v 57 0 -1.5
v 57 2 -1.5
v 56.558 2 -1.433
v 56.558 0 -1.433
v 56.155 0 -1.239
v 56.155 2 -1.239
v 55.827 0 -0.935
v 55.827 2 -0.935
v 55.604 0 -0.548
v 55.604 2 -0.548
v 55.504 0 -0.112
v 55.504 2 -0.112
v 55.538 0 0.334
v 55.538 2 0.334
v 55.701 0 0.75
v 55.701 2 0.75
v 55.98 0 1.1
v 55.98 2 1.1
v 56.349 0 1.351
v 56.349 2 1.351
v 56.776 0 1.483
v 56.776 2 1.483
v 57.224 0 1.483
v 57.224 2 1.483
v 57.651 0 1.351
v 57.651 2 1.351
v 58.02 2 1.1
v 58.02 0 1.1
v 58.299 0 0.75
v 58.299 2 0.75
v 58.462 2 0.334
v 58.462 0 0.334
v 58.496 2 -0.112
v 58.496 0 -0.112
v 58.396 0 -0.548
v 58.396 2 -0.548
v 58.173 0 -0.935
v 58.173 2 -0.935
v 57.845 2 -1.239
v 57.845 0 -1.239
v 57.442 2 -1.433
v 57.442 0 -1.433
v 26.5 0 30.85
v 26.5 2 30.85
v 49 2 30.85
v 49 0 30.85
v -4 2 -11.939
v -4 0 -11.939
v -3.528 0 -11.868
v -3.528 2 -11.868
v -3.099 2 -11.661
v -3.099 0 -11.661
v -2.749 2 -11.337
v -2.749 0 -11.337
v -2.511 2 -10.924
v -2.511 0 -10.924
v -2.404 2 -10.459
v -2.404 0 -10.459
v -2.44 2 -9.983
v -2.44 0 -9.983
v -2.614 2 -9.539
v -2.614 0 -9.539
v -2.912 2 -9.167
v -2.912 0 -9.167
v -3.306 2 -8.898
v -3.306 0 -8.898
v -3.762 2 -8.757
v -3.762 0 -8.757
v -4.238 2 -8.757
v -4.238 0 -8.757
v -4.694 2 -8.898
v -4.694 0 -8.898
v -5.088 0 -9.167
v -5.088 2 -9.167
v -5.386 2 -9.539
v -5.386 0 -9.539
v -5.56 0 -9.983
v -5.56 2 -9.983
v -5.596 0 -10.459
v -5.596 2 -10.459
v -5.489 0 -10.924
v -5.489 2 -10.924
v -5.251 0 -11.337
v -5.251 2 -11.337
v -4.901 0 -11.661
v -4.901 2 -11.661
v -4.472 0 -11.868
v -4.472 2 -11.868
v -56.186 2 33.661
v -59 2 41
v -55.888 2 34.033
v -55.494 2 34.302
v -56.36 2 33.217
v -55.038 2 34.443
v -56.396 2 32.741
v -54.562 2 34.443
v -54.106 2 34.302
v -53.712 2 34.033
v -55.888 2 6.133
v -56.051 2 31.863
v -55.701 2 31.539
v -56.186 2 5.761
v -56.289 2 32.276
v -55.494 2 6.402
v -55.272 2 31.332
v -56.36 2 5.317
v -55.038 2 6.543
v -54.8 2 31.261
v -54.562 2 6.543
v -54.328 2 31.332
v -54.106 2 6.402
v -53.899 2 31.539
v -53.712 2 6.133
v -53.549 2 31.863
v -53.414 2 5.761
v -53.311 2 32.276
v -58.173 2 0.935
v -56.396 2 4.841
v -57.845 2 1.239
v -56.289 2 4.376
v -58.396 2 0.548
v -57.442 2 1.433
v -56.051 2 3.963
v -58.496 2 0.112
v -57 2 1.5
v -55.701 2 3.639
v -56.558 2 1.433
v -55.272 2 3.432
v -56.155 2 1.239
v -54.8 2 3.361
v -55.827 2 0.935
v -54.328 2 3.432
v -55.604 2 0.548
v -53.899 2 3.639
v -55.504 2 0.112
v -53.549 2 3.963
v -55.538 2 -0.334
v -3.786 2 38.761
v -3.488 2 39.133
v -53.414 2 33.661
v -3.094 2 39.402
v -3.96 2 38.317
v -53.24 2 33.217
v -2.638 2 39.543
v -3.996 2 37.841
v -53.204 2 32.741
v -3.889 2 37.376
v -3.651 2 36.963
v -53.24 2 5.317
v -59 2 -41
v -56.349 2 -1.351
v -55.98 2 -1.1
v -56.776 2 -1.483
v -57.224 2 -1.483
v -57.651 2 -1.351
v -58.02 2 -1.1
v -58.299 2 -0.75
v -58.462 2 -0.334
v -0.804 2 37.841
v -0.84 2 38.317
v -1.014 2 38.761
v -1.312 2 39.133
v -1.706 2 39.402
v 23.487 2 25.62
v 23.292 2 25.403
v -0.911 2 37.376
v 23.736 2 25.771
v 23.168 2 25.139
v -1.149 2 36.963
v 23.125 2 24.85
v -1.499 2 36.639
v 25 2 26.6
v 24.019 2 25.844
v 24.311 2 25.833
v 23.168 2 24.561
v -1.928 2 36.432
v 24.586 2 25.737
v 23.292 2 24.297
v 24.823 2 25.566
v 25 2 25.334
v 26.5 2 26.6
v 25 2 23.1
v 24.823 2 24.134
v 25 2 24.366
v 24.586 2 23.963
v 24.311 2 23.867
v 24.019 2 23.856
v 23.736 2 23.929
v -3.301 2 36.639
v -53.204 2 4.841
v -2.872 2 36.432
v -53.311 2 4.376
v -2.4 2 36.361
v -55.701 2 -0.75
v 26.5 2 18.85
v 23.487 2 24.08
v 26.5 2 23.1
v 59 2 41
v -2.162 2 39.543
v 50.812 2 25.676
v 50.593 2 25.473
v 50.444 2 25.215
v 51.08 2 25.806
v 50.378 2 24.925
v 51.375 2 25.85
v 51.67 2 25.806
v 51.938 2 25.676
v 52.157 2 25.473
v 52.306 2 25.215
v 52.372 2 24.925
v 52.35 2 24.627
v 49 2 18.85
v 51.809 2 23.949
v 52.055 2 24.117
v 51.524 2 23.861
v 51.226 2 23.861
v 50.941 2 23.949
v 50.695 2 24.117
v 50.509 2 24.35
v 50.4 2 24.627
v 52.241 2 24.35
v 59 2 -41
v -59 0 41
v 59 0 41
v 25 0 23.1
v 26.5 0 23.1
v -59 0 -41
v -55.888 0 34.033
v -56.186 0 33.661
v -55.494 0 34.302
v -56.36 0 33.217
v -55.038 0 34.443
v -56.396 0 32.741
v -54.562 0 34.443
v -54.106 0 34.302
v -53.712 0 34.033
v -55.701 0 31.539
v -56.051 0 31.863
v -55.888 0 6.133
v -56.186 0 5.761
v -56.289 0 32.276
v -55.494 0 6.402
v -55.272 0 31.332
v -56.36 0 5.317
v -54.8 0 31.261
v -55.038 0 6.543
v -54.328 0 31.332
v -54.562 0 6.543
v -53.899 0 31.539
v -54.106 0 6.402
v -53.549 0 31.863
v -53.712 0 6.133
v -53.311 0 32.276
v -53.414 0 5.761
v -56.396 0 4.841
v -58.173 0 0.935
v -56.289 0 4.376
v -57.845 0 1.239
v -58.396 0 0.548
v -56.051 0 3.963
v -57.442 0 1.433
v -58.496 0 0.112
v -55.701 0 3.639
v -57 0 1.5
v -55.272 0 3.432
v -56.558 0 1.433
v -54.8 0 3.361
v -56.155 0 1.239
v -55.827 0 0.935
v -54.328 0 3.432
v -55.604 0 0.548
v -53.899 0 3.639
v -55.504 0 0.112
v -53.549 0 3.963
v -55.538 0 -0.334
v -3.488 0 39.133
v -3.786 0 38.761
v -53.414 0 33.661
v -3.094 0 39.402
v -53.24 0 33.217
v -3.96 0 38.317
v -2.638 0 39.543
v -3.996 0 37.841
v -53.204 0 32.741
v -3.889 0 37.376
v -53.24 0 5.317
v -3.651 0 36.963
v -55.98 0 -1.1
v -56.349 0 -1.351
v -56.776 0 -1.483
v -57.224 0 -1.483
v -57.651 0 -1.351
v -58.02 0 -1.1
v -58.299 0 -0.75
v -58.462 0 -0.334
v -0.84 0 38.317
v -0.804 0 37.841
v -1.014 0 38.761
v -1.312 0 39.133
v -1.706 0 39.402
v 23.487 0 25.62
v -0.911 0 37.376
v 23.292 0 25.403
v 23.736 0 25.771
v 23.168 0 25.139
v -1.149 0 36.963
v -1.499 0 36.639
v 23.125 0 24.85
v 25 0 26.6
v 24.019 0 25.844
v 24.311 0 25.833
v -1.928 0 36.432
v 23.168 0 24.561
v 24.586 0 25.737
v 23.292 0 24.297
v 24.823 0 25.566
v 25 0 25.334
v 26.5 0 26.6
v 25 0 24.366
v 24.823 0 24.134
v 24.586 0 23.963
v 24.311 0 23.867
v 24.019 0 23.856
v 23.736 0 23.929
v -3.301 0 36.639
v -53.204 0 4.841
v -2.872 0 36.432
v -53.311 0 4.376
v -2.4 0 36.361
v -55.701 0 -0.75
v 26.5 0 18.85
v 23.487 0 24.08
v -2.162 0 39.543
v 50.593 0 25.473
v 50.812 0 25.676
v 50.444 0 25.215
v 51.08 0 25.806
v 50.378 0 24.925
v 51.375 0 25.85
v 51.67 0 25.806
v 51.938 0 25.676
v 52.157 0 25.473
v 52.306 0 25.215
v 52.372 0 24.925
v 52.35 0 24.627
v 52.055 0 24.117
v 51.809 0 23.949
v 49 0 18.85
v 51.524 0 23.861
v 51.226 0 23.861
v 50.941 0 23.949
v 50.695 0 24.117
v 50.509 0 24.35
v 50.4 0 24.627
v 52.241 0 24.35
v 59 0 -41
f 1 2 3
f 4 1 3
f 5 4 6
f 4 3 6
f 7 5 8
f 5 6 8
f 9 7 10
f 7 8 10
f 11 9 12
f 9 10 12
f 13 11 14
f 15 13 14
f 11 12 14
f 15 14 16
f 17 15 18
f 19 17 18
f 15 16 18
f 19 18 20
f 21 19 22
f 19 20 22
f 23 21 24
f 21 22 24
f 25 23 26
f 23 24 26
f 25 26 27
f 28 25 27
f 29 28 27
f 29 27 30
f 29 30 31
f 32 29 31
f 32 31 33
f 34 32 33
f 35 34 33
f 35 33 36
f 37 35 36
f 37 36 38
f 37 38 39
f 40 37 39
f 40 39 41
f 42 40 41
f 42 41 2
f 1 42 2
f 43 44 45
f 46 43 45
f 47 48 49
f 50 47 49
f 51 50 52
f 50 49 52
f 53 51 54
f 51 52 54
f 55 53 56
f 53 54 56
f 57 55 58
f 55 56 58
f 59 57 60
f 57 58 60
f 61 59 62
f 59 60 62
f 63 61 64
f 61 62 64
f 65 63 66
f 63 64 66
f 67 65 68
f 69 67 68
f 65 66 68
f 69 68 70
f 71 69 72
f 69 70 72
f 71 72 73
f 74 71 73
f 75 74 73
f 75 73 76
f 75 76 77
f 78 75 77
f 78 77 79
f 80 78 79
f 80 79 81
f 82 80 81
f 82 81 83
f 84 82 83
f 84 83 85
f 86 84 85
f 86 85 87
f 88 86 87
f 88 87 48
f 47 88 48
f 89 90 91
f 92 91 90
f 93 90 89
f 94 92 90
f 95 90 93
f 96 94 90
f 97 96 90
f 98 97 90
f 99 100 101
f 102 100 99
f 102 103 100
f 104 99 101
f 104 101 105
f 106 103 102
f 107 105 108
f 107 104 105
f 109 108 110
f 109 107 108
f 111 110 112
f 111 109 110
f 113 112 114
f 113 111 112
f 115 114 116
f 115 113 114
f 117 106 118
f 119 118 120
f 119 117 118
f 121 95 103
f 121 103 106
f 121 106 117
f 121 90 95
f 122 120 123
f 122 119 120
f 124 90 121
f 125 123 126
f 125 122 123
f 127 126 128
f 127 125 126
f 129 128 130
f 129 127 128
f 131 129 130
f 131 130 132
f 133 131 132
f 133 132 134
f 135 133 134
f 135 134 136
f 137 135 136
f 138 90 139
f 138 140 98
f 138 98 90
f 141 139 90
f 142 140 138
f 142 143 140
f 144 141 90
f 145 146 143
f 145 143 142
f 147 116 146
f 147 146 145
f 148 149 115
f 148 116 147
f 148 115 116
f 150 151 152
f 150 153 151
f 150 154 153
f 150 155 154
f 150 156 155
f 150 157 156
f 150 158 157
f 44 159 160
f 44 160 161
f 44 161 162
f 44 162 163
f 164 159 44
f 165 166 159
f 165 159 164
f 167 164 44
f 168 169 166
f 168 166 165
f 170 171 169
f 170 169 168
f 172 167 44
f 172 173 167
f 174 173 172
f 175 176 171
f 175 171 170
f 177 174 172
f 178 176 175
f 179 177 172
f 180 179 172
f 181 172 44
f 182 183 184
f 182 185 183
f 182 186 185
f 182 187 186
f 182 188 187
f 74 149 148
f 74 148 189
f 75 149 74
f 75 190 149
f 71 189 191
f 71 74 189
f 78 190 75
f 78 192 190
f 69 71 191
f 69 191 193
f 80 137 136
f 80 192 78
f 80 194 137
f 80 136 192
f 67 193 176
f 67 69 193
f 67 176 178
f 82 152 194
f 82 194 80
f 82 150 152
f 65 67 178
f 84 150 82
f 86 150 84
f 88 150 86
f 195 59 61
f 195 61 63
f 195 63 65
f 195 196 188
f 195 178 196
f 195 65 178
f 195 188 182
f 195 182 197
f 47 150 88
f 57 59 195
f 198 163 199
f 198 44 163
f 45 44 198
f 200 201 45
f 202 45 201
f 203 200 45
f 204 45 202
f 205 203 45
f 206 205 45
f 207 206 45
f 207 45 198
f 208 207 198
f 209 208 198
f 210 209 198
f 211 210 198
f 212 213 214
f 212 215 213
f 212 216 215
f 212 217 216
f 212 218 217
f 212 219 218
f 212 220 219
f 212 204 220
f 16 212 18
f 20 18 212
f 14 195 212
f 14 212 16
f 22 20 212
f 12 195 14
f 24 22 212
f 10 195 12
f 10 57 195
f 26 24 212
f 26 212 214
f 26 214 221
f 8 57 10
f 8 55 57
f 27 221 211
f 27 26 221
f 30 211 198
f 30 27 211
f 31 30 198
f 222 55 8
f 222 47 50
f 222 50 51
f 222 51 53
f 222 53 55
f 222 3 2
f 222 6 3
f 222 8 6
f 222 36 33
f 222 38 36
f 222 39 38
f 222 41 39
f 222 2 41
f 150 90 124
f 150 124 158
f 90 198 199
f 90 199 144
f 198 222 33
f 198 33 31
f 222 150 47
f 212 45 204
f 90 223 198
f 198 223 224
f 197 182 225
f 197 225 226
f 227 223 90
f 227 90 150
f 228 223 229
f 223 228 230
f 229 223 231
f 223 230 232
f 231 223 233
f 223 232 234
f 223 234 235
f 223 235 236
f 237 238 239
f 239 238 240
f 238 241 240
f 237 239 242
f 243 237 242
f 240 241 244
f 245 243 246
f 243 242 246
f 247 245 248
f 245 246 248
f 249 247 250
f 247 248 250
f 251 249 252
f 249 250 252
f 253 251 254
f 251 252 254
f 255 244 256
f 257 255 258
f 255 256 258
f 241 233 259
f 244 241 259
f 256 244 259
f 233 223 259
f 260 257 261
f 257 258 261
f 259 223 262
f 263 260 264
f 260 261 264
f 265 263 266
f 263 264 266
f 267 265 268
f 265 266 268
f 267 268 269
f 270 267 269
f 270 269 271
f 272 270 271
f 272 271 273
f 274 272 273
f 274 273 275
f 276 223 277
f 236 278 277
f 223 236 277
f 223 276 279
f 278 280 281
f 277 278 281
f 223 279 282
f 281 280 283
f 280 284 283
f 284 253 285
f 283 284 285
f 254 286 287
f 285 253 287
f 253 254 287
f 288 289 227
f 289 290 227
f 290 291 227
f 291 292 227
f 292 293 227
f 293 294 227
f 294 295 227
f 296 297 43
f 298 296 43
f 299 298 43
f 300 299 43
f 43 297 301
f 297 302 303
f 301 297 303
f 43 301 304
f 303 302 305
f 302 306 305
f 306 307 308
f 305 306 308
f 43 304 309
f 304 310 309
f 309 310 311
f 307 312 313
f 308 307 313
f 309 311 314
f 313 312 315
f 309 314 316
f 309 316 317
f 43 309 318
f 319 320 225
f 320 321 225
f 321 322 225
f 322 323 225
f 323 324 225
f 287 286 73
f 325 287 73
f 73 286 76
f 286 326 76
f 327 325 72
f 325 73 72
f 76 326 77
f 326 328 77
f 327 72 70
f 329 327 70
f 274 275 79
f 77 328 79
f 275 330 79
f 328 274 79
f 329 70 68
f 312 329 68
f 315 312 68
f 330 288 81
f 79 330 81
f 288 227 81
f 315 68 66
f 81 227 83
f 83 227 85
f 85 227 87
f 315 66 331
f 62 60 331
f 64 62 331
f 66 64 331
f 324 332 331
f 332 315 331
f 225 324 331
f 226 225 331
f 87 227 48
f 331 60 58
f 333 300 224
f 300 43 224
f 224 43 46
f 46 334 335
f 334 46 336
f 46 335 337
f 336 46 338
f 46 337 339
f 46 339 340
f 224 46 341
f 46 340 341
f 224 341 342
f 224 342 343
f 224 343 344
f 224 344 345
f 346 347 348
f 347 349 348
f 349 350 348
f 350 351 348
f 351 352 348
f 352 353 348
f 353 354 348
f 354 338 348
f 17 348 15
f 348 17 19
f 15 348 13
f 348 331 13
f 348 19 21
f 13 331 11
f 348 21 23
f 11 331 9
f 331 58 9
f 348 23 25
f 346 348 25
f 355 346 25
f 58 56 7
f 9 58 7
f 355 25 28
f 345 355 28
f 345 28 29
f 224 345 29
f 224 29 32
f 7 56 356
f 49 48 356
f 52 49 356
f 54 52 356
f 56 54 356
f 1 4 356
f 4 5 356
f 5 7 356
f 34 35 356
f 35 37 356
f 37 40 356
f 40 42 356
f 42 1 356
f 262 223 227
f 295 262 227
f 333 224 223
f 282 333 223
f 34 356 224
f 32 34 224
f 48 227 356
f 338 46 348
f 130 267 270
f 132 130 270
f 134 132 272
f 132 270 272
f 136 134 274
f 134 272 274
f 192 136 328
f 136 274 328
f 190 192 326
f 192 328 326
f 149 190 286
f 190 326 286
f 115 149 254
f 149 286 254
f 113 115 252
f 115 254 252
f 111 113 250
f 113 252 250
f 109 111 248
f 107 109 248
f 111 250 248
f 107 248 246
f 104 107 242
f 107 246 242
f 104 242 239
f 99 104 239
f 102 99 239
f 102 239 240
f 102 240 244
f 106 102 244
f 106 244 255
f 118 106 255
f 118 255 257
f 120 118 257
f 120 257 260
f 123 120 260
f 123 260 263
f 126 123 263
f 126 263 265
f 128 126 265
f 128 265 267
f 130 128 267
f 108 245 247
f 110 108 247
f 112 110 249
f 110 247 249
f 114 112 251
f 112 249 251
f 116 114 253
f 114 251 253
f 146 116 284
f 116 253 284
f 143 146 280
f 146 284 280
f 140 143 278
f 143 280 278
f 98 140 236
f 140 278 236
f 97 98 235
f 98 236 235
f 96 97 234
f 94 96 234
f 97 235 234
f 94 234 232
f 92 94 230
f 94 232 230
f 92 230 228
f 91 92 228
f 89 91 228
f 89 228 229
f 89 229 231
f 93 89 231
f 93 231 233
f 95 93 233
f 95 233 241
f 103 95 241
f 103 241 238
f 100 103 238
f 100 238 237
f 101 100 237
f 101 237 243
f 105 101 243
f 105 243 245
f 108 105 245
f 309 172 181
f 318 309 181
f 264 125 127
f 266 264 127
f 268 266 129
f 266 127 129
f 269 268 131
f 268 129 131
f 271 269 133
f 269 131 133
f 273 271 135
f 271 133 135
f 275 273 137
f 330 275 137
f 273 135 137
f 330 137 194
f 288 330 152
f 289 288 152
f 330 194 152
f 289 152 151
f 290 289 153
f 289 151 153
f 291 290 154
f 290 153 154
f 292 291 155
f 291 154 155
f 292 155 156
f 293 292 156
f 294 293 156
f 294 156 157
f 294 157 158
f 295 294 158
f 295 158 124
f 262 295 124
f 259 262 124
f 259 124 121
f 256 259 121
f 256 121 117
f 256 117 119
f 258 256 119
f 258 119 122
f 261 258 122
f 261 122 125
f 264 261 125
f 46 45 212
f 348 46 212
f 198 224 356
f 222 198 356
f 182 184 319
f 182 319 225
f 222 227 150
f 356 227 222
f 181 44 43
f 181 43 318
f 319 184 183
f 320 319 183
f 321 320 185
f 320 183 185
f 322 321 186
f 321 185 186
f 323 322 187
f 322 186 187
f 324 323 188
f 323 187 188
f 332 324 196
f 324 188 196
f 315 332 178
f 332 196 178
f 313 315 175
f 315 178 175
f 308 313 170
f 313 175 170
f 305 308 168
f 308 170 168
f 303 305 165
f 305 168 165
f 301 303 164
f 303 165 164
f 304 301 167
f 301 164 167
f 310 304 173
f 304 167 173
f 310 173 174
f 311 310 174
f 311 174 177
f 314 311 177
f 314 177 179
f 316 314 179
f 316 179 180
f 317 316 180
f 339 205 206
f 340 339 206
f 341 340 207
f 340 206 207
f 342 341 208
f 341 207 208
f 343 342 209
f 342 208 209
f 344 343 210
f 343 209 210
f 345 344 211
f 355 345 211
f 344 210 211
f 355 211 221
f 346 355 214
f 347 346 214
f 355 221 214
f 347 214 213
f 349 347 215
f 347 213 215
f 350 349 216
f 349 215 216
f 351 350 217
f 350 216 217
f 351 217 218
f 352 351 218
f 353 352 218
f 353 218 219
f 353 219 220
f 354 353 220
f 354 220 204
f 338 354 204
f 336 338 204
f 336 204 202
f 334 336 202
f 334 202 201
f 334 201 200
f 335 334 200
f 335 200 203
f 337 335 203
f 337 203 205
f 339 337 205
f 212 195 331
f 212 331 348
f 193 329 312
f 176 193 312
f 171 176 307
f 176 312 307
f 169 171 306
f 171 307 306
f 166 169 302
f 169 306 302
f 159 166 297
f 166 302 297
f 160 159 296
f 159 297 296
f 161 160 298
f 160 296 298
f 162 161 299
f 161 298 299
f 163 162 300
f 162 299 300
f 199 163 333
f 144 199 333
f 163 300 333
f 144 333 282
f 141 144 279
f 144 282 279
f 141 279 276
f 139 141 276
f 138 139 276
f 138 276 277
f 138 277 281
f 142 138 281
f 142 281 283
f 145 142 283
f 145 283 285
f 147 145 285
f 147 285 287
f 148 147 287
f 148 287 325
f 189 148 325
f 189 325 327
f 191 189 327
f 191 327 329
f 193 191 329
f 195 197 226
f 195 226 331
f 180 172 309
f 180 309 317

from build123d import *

# Parameters (mm, degrees)
SKETCH1_W           = 118
SKETCH1_H           = 82
BOSS_EXTRUDE1_DEPTH = 2
SKETCH3_R           = 1.5
CUT_EXTRUDE5_DEPTH  = 10
SKETCH4_R           = 1.6
CUT_EXTRUDE6_DEPTH  = 10
SKETCH7_R           = 1
SKETCH7_W           = 1.5
SKETCH7_H           = 3.5
CUT_EXTRUDE7_DEPTH  = 10
SKETCH5_W           = 22.5
SKETCH5_H           = 12
CUT_EXTRUDE8_DEPTH  = 10


with BuildPart() as part:
    # Sketch1 → Boss-Extrude1 (new body)
    with BuildSketch(Plane(origin=(0, 0, 0), x_dir=(1, 0, 0), z_dir=(0, 1, 0))):
        Rectangle(SKETCH1_W, SKETCH1_H)
    extrude(amount=BOSS_EXTRUDE1_DEPTH)

    # Sketch3 → Cut-Extrude5 (cut)
    with BuildSketch(Plane(origin=(0, 2, 0), x_dir=(1, 0, 0), z_dir=(0, 1, 0))):
        with Locations(Location((-57, 0, 0), (0, 0, 270))):
            Circle(SKETCH3_R)
        with Locations(Location((57, 0, 0), (0, 0, 90))):
            Circle(SKETCH3_R)
    extrude(amount=-CUT_EXTRUDE5_DEPTH, mode=Mode.SUBTRACT)

    # Sketch4 → Cut-Extrude6 (cut)
    with BuildSketch(Plane.XZ):
        with Locations(Location((-2.4, 37.960584027, 0), (0, 0, 270))):
            Circle(SKETCH4_R)
        with Locations(Location((-54.8, 32.860584027, 0), (0, 0, 270))):
            Circle(SKETCH4_R)
        with Locations(Location((-4, -10.339415973, 0), (0, 0, 270))):
            Circle(SKETCH4_R)
        with Locations(Location((-54.8, 4.960584027, 0), (0, 0, 270))):
            Circle(SKETCH4_R)
    extrude(amount=-CUT_EXTRUDE6_DEPTH, mode=Mode.SUBTRACT)

    # Sketch7 → Cut-Extrude7 (cut)
    with BuildSketch(Plane(origin=(0, 2, 0), x_dir=(1, 0, 0), z_dir=(0, 1, 0))):
        with Locations((24.125, -24.85)):
            Circle(SKETCH7_R)
        with Locations(Location((51.375, -24.85, 0), (0, 0, 270))):
            Circle(SKETCH7_R)
        with Locations((25.75, -24.85)):
            Rectangle(SKETCH7_W, SKETCH7_H)
    extrude(amount=-CUT_EXTRUDE7_DEPTH, mode=Mode.SUBTRACT)

    # Sketch5 → Cut-Extrude8 (cut)
    with BuildSketch(Plane(origin=(0, 2, 0), x_dir=(1, 0, 0), z_dir=(0, 1, 0))):
        with Locations((37.75, -24.85)):
            Rectangle(SKETCH5_W, SKETCH5_H)
    extrude(amount=-CUT_EXTRUDE8_DEPTH, mode=Mode.SUBTRACT)


solid = part.part
